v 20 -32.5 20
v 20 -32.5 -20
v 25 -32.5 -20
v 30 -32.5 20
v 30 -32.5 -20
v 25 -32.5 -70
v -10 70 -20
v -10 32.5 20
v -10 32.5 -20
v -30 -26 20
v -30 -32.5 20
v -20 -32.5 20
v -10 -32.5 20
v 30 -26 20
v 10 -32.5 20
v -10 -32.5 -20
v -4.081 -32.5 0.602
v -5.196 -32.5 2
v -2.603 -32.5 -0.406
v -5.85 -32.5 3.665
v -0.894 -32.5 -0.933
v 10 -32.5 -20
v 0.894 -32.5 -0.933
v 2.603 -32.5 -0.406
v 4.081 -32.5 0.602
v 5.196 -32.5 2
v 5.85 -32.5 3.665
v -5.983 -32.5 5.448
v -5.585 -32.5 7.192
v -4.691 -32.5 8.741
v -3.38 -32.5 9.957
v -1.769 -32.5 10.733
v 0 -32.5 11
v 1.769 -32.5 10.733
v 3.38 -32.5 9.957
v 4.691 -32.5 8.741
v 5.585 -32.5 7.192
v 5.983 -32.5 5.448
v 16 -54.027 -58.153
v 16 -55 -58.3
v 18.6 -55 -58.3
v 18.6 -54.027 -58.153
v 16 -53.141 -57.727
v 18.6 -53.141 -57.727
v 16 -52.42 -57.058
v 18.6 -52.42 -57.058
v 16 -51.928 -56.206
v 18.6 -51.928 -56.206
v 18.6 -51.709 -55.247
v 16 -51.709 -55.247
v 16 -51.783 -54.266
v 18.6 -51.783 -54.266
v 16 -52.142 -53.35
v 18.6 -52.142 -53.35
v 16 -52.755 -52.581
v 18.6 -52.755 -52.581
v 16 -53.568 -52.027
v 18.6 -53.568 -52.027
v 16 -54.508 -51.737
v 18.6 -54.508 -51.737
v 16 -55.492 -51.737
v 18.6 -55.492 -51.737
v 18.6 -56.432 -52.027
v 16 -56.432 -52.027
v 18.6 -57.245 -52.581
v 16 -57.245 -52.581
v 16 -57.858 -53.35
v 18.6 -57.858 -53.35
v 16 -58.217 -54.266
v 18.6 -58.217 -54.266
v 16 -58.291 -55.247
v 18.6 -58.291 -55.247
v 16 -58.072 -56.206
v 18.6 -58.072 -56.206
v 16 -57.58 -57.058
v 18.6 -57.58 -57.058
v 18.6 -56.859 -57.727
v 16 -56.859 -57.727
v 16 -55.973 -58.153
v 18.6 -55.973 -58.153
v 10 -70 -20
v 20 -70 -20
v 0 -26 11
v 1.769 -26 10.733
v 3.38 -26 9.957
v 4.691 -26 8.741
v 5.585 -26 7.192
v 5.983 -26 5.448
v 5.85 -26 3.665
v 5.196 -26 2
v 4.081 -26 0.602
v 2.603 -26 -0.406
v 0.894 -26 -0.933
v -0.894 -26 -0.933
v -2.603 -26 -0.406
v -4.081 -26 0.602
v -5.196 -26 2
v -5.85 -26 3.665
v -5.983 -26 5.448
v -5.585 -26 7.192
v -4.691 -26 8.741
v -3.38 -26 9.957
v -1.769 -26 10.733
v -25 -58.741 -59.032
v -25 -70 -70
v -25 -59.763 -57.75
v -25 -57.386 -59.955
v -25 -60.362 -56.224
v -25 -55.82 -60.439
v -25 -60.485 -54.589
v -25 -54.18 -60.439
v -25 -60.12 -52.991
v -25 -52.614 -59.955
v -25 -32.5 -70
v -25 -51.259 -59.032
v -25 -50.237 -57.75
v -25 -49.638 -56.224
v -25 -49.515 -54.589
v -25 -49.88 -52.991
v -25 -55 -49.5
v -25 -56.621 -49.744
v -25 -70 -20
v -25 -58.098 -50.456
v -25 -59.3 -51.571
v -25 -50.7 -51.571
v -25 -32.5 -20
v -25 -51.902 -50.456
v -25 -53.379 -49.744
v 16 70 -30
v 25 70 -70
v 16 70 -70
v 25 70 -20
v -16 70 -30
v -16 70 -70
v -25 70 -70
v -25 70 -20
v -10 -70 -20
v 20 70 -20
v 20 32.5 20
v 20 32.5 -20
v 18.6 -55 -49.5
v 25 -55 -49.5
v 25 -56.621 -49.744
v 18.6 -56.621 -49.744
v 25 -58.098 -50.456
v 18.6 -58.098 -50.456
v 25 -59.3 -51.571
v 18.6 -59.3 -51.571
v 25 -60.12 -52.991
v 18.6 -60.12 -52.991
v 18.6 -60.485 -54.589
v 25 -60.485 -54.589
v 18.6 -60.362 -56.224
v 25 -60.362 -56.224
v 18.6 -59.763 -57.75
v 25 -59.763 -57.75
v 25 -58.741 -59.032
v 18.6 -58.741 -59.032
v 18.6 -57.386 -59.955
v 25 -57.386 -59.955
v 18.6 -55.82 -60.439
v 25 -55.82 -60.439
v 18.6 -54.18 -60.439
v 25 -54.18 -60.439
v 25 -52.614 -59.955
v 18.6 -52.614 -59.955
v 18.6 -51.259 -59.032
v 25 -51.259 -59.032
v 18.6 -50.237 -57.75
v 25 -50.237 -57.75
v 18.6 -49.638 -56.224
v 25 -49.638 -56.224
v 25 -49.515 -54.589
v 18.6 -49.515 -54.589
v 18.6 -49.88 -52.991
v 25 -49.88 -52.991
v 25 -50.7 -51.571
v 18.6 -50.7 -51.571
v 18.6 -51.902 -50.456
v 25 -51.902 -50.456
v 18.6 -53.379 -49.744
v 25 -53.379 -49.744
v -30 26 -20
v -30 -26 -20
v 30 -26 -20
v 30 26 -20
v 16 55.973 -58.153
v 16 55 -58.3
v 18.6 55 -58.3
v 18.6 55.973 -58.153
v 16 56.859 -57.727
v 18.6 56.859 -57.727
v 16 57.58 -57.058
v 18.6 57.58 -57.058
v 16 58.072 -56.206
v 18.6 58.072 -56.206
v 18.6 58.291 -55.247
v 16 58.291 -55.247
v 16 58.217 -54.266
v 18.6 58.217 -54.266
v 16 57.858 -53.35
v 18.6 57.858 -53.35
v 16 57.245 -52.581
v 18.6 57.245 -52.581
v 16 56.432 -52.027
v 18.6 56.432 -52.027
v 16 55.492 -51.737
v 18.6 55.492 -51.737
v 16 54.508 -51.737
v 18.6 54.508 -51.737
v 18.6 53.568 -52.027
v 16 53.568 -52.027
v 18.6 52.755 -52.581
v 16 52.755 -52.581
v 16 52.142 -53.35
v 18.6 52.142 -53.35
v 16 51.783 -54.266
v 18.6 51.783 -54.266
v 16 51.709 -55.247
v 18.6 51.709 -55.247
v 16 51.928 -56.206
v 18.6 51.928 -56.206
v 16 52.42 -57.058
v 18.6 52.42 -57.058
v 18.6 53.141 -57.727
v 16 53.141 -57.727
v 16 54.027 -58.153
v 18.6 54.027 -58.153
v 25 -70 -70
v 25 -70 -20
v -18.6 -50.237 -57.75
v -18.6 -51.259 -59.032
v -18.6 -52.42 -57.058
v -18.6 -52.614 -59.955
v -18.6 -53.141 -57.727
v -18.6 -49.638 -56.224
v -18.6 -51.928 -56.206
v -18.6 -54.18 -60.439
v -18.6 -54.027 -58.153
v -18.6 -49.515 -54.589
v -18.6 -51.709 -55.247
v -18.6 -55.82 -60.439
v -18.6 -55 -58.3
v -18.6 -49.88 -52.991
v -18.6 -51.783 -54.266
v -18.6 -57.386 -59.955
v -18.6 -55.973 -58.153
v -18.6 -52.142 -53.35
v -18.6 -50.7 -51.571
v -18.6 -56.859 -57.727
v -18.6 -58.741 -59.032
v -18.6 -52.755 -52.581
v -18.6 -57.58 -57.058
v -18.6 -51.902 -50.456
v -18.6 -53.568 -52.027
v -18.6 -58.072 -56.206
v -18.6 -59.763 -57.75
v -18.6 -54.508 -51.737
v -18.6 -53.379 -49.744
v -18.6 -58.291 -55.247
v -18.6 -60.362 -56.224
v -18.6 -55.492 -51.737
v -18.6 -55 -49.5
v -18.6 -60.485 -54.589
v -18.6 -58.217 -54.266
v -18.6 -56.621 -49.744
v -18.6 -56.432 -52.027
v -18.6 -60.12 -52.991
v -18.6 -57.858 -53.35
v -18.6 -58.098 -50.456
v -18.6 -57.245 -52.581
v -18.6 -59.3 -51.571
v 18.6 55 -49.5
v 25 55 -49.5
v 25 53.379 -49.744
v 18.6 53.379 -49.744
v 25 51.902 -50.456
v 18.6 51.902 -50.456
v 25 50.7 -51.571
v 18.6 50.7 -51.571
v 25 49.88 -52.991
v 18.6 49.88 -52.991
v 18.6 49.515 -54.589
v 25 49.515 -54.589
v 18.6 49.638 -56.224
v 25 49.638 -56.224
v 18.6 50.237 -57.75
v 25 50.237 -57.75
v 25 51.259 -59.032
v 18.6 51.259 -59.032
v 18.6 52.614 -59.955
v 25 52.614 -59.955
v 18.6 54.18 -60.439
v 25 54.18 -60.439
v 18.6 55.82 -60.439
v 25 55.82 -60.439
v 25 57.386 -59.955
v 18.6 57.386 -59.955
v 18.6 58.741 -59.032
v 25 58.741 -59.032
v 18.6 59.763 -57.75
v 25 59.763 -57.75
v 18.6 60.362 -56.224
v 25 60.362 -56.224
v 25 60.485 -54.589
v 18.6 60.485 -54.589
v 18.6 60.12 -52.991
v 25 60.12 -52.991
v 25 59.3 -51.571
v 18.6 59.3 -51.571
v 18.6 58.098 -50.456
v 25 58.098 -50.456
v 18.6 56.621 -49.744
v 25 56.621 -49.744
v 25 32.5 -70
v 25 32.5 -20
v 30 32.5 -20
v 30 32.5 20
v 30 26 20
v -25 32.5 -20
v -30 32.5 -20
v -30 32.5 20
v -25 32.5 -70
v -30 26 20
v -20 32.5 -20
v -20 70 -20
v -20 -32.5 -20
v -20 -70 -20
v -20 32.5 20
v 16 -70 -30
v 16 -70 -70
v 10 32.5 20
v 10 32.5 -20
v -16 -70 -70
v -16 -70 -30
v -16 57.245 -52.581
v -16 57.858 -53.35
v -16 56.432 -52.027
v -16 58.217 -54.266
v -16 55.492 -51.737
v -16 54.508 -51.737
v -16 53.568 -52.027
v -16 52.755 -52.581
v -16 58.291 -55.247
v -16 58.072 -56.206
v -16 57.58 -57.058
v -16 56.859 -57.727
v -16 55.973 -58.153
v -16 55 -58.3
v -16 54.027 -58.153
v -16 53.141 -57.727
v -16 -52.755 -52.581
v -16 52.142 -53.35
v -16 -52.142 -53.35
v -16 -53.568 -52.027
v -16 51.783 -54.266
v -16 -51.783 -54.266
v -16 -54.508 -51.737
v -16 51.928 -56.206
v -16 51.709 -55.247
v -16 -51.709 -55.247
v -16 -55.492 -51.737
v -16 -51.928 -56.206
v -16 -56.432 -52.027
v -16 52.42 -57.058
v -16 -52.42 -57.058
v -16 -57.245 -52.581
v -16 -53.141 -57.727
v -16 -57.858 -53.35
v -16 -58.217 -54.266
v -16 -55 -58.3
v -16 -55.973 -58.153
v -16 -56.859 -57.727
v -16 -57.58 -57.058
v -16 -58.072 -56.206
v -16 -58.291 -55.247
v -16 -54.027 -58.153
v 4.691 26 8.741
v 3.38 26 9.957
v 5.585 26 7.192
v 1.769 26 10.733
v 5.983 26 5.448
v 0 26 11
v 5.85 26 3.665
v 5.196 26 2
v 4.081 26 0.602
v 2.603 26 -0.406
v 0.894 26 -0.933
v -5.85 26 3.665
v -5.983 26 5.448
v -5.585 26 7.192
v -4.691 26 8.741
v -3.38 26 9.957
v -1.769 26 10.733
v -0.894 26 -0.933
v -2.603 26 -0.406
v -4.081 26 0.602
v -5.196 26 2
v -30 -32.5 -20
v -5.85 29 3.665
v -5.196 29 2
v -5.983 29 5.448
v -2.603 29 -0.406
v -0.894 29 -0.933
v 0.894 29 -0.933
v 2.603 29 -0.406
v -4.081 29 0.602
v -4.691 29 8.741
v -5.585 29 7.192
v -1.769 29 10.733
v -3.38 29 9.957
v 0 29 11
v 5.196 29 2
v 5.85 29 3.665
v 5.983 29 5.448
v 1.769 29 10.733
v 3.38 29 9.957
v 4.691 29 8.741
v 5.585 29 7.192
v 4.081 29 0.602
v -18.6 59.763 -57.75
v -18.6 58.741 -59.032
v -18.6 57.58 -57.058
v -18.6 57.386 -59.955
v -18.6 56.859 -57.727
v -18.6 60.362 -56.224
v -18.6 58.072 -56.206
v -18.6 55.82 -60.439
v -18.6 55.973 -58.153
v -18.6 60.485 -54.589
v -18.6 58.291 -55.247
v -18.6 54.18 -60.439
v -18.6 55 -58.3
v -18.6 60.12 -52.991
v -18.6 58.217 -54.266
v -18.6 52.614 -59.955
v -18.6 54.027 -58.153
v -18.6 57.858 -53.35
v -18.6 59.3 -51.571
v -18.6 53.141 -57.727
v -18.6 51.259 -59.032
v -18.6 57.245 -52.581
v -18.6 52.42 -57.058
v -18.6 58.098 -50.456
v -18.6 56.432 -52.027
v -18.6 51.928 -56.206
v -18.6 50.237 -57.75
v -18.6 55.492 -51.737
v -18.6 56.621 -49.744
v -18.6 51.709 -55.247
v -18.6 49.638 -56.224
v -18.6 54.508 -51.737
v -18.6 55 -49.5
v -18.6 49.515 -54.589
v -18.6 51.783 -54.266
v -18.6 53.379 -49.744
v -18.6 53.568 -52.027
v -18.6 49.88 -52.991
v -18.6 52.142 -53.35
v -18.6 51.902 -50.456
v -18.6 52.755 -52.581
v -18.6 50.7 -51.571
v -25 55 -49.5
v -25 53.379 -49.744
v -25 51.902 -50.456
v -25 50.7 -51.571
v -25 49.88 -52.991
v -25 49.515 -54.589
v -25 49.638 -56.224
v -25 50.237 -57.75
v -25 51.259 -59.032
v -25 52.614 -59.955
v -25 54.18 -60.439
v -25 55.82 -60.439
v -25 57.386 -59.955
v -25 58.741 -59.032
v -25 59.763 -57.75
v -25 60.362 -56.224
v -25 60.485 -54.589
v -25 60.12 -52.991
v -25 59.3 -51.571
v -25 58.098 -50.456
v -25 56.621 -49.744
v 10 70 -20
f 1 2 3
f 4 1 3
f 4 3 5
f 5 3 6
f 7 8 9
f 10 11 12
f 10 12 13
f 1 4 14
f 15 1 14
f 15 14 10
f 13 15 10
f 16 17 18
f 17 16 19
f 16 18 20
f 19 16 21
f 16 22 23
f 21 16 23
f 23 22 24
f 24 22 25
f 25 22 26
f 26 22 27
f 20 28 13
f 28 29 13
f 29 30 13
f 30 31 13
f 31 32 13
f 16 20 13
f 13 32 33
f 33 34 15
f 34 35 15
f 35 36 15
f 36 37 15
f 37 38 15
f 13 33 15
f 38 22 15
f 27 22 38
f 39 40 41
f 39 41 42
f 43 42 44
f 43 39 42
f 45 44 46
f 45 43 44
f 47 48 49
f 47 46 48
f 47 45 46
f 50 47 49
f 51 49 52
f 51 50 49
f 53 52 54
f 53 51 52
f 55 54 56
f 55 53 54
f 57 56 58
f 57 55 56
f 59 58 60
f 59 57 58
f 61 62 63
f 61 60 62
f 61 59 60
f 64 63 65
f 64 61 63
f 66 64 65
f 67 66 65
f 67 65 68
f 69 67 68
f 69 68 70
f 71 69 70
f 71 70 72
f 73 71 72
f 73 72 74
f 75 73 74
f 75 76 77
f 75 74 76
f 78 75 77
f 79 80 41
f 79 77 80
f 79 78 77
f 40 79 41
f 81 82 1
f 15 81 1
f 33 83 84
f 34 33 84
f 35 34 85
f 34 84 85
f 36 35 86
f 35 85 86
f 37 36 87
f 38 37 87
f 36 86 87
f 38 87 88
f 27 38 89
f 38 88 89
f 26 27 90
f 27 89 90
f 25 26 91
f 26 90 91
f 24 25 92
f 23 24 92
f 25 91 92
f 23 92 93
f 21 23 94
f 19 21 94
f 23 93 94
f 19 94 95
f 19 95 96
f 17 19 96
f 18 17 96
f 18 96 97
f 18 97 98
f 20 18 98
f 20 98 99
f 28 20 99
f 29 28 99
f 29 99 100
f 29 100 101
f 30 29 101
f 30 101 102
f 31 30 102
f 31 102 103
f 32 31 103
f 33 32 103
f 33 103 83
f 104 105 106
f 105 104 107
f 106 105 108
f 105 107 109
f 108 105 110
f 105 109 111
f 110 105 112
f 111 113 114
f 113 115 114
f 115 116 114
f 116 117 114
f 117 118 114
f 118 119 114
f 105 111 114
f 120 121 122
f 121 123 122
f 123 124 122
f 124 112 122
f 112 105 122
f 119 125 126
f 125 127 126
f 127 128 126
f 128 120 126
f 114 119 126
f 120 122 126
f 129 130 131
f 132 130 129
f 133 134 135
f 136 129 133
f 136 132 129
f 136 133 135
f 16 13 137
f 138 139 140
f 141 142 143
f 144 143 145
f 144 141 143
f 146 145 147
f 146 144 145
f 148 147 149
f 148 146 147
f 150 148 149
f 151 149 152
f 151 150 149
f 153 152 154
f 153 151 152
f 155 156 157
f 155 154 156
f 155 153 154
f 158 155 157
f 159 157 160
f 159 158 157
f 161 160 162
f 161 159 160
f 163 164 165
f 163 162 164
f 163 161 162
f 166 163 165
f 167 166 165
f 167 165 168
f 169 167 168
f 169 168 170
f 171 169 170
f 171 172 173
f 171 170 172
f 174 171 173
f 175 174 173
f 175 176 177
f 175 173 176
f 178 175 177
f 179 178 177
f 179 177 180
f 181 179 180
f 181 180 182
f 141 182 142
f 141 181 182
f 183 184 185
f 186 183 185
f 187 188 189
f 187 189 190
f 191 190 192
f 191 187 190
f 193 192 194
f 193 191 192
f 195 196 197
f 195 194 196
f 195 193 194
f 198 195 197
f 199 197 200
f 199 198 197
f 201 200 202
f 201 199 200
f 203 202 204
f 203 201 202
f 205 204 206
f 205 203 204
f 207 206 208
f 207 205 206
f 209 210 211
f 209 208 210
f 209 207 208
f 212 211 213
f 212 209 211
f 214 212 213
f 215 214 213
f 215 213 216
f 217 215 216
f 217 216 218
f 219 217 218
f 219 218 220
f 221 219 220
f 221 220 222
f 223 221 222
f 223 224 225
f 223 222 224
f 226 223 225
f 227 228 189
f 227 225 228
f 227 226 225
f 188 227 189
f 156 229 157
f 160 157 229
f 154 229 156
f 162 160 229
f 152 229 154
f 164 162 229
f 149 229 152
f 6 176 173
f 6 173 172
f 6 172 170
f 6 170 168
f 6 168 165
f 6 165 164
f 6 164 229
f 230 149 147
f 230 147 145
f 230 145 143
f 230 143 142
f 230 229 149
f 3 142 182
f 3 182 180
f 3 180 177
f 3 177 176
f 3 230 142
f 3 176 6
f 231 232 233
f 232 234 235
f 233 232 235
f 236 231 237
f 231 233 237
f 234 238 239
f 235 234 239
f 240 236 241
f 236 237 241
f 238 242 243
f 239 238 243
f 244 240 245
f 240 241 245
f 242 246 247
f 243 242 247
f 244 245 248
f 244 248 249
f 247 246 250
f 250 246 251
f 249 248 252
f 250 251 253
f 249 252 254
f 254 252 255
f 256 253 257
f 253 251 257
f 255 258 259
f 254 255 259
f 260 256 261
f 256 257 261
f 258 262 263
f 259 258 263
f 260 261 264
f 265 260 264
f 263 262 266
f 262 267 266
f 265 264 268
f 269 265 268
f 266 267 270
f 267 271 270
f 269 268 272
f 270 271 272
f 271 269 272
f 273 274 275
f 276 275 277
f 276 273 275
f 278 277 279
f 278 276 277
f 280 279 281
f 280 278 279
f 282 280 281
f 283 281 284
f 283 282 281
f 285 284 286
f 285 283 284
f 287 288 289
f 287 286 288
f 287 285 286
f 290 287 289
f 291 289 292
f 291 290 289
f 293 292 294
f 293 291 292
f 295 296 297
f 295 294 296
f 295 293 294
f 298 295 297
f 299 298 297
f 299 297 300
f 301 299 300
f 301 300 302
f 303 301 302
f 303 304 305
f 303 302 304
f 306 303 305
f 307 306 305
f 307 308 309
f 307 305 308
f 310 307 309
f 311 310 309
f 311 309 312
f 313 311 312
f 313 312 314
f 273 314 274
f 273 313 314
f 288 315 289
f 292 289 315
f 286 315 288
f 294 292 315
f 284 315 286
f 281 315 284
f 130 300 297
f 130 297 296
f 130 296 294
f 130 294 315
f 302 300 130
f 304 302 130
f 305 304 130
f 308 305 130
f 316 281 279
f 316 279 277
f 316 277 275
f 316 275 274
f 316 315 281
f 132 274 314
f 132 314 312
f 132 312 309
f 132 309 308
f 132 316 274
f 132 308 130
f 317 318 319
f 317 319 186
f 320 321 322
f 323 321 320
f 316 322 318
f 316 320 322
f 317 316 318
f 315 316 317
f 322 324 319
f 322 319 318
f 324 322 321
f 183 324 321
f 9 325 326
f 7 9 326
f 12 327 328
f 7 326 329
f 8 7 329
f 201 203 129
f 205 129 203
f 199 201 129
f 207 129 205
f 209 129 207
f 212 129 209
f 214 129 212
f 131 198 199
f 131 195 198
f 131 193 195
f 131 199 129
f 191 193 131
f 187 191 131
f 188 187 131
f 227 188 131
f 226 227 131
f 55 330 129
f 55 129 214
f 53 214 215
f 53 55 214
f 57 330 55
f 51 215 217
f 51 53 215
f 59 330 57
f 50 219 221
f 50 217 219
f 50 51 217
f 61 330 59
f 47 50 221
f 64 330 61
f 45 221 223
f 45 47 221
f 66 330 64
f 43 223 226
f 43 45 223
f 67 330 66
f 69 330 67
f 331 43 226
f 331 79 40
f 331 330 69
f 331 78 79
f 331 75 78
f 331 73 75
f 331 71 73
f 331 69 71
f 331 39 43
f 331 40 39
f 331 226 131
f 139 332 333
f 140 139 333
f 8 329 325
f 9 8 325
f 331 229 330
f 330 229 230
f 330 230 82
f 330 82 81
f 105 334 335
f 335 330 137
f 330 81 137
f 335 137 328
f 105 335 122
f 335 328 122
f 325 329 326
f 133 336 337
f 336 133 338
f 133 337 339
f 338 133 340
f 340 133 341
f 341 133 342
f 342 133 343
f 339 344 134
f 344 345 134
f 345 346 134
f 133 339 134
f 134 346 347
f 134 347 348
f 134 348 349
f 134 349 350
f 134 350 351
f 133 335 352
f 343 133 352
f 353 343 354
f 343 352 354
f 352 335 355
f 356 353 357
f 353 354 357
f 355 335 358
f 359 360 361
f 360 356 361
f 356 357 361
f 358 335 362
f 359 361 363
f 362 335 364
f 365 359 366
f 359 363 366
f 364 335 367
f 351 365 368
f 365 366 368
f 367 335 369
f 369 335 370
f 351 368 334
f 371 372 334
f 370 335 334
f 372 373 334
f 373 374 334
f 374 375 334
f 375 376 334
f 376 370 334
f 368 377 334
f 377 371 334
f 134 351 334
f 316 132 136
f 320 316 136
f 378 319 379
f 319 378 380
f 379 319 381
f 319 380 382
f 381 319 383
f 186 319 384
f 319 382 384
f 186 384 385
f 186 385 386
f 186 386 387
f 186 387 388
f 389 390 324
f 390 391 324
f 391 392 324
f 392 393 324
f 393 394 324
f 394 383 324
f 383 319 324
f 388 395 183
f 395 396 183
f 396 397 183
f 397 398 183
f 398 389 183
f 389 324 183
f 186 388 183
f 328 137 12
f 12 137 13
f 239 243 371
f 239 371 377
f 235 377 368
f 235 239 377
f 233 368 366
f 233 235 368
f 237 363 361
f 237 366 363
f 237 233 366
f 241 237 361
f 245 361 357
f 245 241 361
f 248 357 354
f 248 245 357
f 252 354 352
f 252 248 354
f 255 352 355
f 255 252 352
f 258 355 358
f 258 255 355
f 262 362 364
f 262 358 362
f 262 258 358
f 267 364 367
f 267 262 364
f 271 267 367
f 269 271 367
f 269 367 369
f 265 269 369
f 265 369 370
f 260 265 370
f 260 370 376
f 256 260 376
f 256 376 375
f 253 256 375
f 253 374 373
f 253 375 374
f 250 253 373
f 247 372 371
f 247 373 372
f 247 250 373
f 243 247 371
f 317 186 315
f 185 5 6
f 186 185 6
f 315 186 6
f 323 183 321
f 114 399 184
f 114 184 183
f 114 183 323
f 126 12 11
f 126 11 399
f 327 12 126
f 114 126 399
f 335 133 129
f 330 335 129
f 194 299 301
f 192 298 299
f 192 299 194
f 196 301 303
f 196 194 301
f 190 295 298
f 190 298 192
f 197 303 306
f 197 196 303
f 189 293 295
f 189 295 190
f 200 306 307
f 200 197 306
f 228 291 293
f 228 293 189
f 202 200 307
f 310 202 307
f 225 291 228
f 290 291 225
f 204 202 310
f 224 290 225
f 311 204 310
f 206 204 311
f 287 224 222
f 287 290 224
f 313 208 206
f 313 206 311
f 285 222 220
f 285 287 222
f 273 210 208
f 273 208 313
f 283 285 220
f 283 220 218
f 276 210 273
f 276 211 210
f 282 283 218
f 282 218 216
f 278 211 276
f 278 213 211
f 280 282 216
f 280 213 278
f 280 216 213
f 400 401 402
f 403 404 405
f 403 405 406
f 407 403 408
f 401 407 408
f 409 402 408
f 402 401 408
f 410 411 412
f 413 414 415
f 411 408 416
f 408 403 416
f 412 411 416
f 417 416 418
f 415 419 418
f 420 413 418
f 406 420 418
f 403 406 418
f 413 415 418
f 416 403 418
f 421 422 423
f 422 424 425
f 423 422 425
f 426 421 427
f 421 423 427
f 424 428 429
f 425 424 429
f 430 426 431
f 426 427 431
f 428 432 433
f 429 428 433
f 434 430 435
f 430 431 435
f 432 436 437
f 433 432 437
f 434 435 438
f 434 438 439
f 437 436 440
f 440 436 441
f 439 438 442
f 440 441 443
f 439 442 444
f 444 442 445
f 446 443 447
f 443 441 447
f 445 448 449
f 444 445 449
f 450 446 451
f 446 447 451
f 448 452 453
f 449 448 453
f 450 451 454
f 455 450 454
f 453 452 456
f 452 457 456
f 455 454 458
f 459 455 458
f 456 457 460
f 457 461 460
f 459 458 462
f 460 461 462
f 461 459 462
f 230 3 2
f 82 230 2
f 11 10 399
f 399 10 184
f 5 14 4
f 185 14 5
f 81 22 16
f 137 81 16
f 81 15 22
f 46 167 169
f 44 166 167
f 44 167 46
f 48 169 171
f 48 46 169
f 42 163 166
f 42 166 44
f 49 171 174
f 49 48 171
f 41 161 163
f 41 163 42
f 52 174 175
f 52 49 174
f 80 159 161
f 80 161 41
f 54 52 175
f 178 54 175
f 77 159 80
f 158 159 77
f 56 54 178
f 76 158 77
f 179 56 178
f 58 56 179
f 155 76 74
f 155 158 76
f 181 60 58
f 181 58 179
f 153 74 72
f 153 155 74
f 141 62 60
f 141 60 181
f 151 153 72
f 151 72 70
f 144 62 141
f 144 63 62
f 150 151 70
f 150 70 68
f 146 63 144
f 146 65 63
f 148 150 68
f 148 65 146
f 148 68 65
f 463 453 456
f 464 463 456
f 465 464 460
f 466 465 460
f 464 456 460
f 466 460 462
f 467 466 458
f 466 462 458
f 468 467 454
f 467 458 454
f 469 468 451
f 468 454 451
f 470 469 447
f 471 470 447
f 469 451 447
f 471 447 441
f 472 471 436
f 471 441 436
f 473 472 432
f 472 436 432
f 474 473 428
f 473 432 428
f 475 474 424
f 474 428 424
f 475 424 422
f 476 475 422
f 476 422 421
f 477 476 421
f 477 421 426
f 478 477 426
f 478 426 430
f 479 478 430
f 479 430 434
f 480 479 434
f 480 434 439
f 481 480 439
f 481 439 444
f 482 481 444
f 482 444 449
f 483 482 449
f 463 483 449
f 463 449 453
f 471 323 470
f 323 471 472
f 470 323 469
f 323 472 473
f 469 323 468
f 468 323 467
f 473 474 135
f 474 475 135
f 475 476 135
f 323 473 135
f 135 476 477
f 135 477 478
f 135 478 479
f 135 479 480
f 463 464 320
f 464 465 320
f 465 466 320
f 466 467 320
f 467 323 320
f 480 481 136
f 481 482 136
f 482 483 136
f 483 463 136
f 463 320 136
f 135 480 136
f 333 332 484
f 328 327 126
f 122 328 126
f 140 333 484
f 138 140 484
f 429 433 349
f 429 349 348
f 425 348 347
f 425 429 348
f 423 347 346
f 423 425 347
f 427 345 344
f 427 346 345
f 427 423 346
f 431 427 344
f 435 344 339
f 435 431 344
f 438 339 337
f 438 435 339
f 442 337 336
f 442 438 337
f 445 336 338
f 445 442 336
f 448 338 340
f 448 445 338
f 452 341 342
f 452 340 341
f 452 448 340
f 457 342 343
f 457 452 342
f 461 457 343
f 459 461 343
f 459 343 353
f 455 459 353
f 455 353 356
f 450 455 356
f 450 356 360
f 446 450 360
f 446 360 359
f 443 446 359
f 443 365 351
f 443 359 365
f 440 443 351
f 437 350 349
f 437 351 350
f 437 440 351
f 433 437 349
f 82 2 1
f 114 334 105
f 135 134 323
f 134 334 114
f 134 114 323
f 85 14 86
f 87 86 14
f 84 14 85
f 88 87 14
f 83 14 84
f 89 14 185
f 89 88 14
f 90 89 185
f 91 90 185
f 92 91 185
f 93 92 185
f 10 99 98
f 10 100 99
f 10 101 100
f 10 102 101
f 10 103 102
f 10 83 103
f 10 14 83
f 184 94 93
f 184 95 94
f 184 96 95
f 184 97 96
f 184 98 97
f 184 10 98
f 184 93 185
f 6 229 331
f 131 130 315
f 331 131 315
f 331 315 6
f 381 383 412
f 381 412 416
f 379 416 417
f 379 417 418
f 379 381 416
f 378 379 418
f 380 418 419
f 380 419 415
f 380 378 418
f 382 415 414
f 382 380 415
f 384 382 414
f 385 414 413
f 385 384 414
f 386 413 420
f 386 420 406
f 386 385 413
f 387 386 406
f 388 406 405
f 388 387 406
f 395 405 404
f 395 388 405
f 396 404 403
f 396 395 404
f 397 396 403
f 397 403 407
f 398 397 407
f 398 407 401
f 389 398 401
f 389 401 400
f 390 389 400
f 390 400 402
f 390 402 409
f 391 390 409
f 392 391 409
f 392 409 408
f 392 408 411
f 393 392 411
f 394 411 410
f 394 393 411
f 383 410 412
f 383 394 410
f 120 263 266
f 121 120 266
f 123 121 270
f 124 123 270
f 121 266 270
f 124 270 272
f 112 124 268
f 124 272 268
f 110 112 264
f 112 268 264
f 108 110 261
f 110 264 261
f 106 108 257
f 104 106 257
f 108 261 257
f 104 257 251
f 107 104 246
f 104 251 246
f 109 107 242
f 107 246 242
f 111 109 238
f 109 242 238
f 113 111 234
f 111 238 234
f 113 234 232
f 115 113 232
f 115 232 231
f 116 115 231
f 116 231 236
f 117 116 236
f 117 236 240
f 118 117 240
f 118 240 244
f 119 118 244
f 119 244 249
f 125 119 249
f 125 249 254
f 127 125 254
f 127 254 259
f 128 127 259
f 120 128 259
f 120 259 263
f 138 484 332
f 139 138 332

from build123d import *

# Parameters (mm, degrees)
SKETCH1_W               = 40
SKETCH1_H               = 65
BOSS_EXTRUDE1_DEPTH     = 30
CUT_EXTRUDE1_DEPTH      = 49.541219597
CUT_EXTRUDE1_DEPTH_BACK = 49.541219597
SKETCH2_W               = 40
SKETCH2_H               = 52
SKETCH3_R               = 6
CUT_EXTRUDE2_DEPTH      = 32.5
SKETCH4_W               = 50
SKETCH4_H               = 140
BOSS_EXTRUDE2_DEPTH     = 50
BOSS_EXTRUDE3_DEPTH     = 20
CUT_EXTRUDE3_DEPTH      = 10
CUT_EXTRUDE4_DEPTH      = 104.440804328
CUT_EXTRUDE4_DEPTH_BACK = 104.440804328
SKETCH10_W              = 32
SKETCH10_H              = 40
CUT_EXTRUDE5_DEPTH      = 104.440804328
CUT_EXTRUDE5_DEPTH_BACK = 104.440804328
SKETCH11_R              = 3.3
CUT_EXTRUDE6_START      = -6.4
SKETCH12_R              = 5.5
CUT_EXTRUDE6_DEPTH      = 120.647516529
SKETCH13_R              = 6
CUT_EXTRUDE7_DEPTH      = 3
BOSS_EXTRUDE4_START     = -32.5
BOSS_EXTRUDE4_DEPTH     = 65


with BuildPart() as part:
    # Sketch1 → Boss-Extrude1 (new, symmetric)
    with BuildSketch(Plane(origin=(0, 0, 0), x_dir=(0, 0, -1), z_dir=(1, 0, 0))):
        Rectangle(SKETCH1_W, SKETCH1_H)
    extrude(amount=BOSS_EXTRUDE1_DEPTH, both=True)

    # Sketch2 → Cut-Extrude1 (cut, two sides: drawn at the far end of the back side and taken through both)
    with BuildSketch(Plane(origin=(0, 0, 0), x_dir=(0, 0, -1), z_dir=(1, 0, 0)).offset(-CUT_EXTRUDE1_DEPTH_BACK)):
        Rectangle(SKETCH2_W, SKETCH2_H)
    extrude(amount=CUT_EXTRUDE1_DEPTH + CUT_EXTRUDE1_DEPTH_BACK, mode=Mode.SUBTRACT)


with BuildPart() as cut_extrude1_piece_1:
    # of the separate pieces the step leaves, piece 1, a body of its own (cut_extrude1_pieces)
    add(part.part.solids().sort_by_distance((-30, -32.5, 20))[0])

    # Sketch3 → Cut-Extrude2 (cut)
    with BuildSketch(Plane(origin=(0, 0, 0), x_dir=(1, 0, 0), z_dir=(0, 1, 0))):
        with Locations(Location((0, -5, 0), (0, 0, 270))):
            Circle(SKETCH3_R)
    extrude(amount=-CUT_EXTRUDE2_DEPTH, mode=Mode.SUBTRACT)

    # Sketch8 → Boss-Extrude3 (add, symmetric)
    with BuildSketch(Plane(origin=(0, 0, 0), x_dir=(0, 0, -1), z_dir=(1, 0, 0))):
        Polygon((20, 70), (-20, 32.5), (20, 32.5), align=None)
        Polygon((20, -32.5), (20, -70), (-20, -32.5), align=None)
    extrude(amount=BOSS_EXTRUDE3_DEPTH, both=True)


with BuildPart() as cut_extrude1_piece_2:
    # of the separate pieces the step leaves, piece 2, a body of its own (cut_extrude1_pieces)
    add(part.part.solids().sort_by_distance((-30, 32.5, 20))[0])

    # Sketch4 → Boss-Extrude2 (add)
    with BuildSketch(Plane(origin=(0, 0, -20), x_dir=(-1, 0, 0), z_dir=(0, 0, -1))):
        Rectangle(SKETCH4_W, SKETCH4_H)
    extrude(amount=BOSS_EXTRUDE2_DEPTH)

    # Sketch10 → Cut-Extrude4 (cut, two sides: drawn at the far end of the back side and taken through both)
    with BuildSketch(Plane(origin=(0, 0, 0), x_dir=(1, 0, 0), z_dir=(0, 1, 0)).offset(-CUT_EXTRUDE4_DEPTH_BACK)):
        with Locations((0, 50)):
            Rectangle(SKETCH10_W, SKETCH10_H)
    extrude(amount=CUT_EXTRUDE4_DEPTH + CUT_EXTRUDE4_DEPTH_BACK, mode=Mode.SUBTRACT)

    # Sketch11 → Cut-Extrude5 (cut, two sides: drawn at the far end of the back side and taken through both)
    with BuildSketch(Plane(origin=(0, 0, 0), x_dir=(0, 0, -1), z_dir=(1, 0, 0)).offset(-CUT_EXTRUDE5_DEPTH_BACK)):
        with Locations((55, 55)):
            Circle(SKETCH11_R)
        with Locations((55, -55)):
            Circle(SKETCH11_R)
    extrude(amount=CUT_EXTRUDE5_DEPTH + CUT_EXTRUDE5_DEPTH_BACK, mode=Mode.SUBTRACT)

    # Sketch12 → Cut-Extrude6 (cut)
    with BuildSketch(Plane(origin=(25, 0, 0), x_dir=(0, 0, -1), z_dir=(1, 0, 0)).offset(CUT_EXTRUDE6_START)):
        with Locations(Location((55, 55, 0), (0, 0, 180))):
            Circle(SKETCH12_R)
        with Locations(Location((55, -55, 0), (0, 0, 180))):
            Circle(SKETCH12_R)
    cut_extrude6 = extrude(amount=CUT_EXTRUDE6_DEPTH, mode=Mode.SUBTRACT)

    # Mirror1: Cut-Extrude6 across plane
    add(cut_extrude6.mirror(Plane(origin=(0, 0, 0), x_dir=(0, 0, 1), z_dir=(1, 0, 0))), mode=Mode.SUBTRACT)

    # Sketch13 → Cut-Extrude7 (cut)
    with BuildSketch(Plane(origin=(0, 26, 0), x_dir=(1, 0, 0), z_dir=(0, 1, 0))):
        with Locations(Location((0, -5, 0), (0, 0, 270))):
            Circle(SKETCH13_R)
    extrude(amount=CUT_EXTRUDE7_DEPTH, mode=Mode.SUBTRACT)



with BuildPart() as boss_extrude3_piece_1:
    # of the separate pieces the step leaves, piece 1, a body of its own (boss_extrude3_pieces)
    add(cut_extrude1_piece_1.part.solids().sort_by_distance((-20, -32.5, 20))[0])


with BuildPart() as boss_extrude3_piece_2:
    # of the separate pieces the step leaves, piece 2, a body of its own (boss_extrude3_pieces)
    add(cut_extrude1_piece_1.part.solids().sort_by_distance((-20, 70, -20))[0])


with BuildPart() as cut_extrude3_tool:
    # Sketch9 → Cut-Extrude3 (new, symmetric)
    with BuildSketch(Plane(origin=(0, 0, 0), x_dir=(0, 0, -1), z_dir=(1, 0, 0))):
        Polygon((20, 70), (-20, 32.5), (20, 32.5), align=None)
        Polygon((-20, -32.5), (20, -70), (20, -32.5), align=None)
    extrude(amount=CUT_EXTRUDE3_DEPTH, both=True)


with BuildPart() as boss_extrude3_piece_1_1:
    add(boss_extrude3_piece_1.part)

    # Cut-Extrude3: cut by cut_extrude3_tool
    add(cut_extrude3_tool.part, mode=Mode.SUBTRACT)


with BuildPart() as boss_extrude3_piece_2_1:
    add(boss_extrude3_piece_2.part)

    # Cut-Extrude3: cut by cut_extrude3_tool
    add(cut_extrude3_tool.part, mode=Mode.SUBTRACT)


with BuildPart() as cut_extrude1_piece_2_1:
    add(cut_extrude1_piece_2.part)

    add(boss_extrude3_piece_1_1.part)  # Boss-Extrude4 merges Boss-Extrude3 piece 1
    # Sketch15 → Boss-Extrude4 (add)
    with BuildSketch(Plane(origin=(0, 0, 0), x_dir=(1, 0, 0), z_dir=(0, 1, 0)).offset(BOSS_EXTRUDE4_START)):
        Polygon((30, 20), (25, 70), (25, 20), align=None)
        Polygon((-25, 20), (-30, 20), (-25, 70), align=None)
    extrude(amount=BOSS_EXTRUDE4_DEPTH)


solid = Compound([boss_extrude3_piece_2_1.part, cut_extrude1_piece_2_1.part])
